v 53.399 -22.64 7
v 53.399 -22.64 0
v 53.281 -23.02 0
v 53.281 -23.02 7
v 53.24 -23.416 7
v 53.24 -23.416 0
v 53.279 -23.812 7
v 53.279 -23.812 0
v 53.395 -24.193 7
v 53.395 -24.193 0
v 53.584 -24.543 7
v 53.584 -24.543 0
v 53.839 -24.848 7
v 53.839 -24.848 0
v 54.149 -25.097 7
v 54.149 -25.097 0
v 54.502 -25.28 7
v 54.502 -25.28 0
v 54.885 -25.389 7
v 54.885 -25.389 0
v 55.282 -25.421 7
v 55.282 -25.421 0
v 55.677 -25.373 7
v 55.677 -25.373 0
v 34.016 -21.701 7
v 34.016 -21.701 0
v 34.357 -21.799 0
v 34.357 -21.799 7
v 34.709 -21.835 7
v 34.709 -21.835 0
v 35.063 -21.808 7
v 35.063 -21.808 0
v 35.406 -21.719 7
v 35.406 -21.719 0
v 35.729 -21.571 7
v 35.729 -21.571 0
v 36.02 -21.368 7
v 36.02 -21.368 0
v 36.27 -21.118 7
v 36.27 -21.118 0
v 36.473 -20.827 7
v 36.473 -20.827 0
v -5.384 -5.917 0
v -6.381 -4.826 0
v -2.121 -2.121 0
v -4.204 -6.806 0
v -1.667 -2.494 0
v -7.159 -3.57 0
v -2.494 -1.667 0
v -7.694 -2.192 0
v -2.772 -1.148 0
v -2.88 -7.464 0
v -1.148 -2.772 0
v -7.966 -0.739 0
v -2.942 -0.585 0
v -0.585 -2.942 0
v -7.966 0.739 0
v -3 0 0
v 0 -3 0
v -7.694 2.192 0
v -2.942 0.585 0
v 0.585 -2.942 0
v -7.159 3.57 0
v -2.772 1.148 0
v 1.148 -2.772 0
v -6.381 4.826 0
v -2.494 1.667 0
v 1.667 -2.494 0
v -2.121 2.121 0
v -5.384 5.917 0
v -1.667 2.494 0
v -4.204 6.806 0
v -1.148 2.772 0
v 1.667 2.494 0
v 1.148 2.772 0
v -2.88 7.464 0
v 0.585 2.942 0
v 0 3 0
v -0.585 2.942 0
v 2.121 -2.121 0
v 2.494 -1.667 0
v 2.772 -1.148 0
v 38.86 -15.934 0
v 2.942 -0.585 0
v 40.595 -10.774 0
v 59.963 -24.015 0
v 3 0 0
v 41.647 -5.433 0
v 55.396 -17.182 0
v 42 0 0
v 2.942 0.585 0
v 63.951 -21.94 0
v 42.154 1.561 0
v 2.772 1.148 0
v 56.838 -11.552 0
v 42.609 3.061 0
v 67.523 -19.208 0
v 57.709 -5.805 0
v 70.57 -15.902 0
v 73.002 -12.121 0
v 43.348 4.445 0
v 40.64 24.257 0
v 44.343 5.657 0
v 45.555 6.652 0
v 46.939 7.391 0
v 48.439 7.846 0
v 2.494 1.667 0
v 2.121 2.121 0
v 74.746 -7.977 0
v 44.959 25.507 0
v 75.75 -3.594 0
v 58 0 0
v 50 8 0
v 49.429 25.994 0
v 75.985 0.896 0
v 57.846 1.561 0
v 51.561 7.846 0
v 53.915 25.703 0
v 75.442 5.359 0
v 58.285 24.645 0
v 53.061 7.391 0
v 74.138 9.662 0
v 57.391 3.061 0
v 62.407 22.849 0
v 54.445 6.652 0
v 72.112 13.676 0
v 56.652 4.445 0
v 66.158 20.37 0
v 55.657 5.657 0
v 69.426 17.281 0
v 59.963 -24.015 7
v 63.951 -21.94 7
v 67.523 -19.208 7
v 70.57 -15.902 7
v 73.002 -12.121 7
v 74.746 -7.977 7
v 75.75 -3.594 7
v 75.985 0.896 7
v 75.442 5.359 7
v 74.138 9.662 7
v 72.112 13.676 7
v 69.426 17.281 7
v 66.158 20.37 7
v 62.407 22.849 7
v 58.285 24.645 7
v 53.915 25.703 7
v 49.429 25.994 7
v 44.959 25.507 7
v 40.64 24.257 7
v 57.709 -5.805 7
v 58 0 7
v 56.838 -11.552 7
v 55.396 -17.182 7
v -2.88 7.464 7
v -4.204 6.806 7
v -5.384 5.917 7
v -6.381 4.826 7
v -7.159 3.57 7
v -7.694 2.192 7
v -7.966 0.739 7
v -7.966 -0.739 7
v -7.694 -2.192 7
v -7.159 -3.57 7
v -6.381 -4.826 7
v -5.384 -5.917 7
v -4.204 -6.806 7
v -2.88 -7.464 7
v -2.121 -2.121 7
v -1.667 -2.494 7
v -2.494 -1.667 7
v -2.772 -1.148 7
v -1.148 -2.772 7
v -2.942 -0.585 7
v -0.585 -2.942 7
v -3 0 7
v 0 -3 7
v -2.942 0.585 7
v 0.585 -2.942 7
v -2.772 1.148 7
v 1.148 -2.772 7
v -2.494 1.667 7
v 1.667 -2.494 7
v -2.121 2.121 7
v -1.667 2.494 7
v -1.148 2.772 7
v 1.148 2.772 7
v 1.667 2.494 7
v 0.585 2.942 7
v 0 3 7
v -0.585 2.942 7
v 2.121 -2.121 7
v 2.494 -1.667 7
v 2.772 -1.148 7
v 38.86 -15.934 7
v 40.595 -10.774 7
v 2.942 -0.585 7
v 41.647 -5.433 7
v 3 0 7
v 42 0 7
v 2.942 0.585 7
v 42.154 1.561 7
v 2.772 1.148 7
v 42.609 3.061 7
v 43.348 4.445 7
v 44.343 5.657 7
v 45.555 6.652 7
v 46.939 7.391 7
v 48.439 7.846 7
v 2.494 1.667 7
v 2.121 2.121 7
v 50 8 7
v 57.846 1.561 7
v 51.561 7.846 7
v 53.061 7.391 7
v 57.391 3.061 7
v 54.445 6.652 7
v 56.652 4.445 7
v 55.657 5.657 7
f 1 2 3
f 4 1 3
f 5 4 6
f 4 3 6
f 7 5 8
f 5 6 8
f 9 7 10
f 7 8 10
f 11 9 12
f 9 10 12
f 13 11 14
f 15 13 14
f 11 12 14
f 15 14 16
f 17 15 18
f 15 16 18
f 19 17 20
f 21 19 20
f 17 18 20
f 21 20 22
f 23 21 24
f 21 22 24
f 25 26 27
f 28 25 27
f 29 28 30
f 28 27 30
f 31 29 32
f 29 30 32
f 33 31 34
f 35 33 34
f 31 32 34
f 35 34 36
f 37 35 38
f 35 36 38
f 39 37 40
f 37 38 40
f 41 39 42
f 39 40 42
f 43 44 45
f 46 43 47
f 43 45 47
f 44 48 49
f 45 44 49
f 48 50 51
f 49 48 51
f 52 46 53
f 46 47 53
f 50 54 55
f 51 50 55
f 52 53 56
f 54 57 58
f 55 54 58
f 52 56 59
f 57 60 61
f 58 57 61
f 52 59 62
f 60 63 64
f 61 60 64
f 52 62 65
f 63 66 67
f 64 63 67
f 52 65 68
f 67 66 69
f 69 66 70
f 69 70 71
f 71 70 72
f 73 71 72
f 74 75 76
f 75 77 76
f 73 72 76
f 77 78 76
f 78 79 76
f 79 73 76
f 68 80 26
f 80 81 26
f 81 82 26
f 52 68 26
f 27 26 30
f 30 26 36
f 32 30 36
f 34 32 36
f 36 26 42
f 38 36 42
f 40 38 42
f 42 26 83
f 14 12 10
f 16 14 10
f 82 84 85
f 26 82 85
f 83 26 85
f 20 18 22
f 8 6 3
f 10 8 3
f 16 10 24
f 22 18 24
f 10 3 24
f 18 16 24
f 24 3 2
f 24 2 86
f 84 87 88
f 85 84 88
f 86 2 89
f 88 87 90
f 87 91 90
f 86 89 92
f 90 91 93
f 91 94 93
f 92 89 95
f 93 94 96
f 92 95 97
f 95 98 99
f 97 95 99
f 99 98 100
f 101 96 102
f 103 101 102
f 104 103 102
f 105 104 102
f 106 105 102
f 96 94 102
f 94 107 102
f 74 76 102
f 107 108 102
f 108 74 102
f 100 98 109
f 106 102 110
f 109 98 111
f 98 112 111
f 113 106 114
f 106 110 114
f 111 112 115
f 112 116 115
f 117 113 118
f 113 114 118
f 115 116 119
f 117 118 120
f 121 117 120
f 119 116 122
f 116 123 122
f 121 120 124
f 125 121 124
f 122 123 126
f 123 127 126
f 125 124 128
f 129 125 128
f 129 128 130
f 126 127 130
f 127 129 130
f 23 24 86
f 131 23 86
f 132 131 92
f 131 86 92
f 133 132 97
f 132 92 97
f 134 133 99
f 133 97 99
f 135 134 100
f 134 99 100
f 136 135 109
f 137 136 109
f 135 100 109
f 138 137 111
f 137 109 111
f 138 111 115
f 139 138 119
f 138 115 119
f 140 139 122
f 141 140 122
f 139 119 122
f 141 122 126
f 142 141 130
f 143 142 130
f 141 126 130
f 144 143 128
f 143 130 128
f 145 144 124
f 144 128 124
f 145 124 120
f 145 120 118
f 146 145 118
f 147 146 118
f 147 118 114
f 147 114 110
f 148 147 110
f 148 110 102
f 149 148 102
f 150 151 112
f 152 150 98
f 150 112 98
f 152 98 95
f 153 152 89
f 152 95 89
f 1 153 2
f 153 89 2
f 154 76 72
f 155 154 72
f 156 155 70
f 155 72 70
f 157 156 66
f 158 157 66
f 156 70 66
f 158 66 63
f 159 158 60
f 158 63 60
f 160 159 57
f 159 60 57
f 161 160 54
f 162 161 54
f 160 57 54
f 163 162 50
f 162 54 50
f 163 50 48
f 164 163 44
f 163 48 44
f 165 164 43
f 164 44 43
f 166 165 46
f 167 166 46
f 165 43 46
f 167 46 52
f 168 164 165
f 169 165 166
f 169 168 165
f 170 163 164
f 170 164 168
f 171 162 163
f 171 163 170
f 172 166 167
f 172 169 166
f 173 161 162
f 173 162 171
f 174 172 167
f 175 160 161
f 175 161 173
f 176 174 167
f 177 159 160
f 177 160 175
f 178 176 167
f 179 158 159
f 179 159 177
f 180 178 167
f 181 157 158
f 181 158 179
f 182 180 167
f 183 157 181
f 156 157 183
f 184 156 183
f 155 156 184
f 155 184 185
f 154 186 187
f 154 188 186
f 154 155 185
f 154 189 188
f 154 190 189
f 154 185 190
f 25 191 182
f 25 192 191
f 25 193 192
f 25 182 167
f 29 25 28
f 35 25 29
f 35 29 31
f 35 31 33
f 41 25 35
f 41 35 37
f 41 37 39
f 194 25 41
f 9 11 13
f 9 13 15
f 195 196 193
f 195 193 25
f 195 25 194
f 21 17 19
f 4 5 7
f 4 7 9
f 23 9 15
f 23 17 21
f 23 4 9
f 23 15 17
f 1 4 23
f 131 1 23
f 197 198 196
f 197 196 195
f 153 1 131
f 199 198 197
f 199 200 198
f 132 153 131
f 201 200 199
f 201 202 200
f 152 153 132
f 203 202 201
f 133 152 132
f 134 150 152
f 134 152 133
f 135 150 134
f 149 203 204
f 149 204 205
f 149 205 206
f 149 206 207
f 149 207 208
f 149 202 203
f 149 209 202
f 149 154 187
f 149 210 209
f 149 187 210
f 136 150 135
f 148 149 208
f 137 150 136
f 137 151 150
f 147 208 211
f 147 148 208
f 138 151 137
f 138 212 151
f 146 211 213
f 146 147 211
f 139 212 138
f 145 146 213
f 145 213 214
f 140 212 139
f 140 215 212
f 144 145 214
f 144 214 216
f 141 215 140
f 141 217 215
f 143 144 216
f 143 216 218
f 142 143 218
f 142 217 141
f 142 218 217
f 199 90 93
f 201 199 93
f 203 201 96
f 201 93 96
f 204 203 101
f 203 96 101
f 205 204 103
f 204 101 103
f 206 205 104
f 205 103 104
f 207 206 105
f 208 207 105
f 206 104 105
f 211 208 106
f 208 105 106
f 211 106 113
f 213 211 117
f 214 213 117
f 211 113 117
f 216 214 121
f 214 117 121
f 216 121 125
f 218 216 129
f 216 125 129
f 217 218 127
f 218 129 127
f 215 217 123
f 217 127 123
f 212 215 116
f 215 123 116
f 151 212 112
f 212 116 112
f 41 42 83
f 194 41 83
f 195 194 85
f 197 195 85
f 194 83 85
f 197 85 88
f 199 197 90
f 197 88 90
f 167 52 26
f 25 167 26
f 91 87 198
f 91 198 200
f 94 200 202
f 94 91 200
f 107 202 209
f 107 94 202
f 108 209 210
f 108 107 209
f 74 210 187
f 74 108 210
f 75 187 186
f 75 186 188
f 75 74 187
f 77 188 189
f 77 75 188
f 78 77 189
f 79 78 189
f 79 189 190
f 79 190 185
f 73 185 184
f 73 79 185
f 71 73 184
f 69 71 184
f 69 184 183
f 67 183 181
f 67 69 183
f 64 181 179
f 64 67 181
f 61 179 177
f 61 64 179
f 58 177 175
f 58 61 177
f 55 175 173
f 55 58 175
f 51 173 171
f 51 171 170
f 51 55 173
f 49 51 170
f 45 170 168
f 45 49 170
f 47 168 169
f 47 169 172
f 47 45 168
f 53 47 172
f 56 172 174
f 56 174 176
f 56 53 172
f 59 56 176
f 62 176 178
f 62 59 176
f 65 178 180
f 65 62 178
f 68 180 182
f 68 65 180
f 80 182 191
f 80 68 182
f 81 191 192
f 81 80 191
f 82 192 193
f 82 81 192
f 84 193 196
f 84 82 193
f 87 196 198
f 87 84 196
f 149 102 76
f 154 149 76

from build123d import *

# Parameters (mm, degrees)
SKICA1_R                = 3
P_IDAT_VYSUNUT_M2_DEPTH = 7


with BuildPart() as part:
    # Skica1 → Přidat vysunutím2 (new body)
    with BuildSketch(Plane.XY):
        with BuildLine():
            Line((40.64, 24.256759883), (-2.88, 7.463618425))
            ThreePointArc((-2.88, 7.463618425), (-8, 0), (-2.88, -7.463618425))
            Line((-2.88, -7.463618425), (34.015875108, -21.700696777))
            ThreePointArc((34.015875108, -21.700696777), (35.406329056, -21.719066966), (36.472668864, -20.82653178))
            ThreePointArc((36.472668864, -20.82653178), (40.594655389, -10.773762289), (42, 0))
            ThreePointArc((42, 0), (50, 8), (58, 0))
            ThreePointArc((58, 0), (56.838027177, -11.55156555), (53.398666667, -22.640282644))
            ThreePointArc((53.398666667, -22.640282644), (53.703822927, -24.701669361), (55.676666667, -25.37273055))
            ThreePointArc((55.676666667, -25.37273055), (74.88299251, 7.539010793), (40.64, 24.256759883))
        make_face()
        Circle(SKICA1_R, mode=Mode.SUBTRACT)
    extrude(amount=P_IDAT_VYSUNUT_M2_DEPTH)


solid = part.part
